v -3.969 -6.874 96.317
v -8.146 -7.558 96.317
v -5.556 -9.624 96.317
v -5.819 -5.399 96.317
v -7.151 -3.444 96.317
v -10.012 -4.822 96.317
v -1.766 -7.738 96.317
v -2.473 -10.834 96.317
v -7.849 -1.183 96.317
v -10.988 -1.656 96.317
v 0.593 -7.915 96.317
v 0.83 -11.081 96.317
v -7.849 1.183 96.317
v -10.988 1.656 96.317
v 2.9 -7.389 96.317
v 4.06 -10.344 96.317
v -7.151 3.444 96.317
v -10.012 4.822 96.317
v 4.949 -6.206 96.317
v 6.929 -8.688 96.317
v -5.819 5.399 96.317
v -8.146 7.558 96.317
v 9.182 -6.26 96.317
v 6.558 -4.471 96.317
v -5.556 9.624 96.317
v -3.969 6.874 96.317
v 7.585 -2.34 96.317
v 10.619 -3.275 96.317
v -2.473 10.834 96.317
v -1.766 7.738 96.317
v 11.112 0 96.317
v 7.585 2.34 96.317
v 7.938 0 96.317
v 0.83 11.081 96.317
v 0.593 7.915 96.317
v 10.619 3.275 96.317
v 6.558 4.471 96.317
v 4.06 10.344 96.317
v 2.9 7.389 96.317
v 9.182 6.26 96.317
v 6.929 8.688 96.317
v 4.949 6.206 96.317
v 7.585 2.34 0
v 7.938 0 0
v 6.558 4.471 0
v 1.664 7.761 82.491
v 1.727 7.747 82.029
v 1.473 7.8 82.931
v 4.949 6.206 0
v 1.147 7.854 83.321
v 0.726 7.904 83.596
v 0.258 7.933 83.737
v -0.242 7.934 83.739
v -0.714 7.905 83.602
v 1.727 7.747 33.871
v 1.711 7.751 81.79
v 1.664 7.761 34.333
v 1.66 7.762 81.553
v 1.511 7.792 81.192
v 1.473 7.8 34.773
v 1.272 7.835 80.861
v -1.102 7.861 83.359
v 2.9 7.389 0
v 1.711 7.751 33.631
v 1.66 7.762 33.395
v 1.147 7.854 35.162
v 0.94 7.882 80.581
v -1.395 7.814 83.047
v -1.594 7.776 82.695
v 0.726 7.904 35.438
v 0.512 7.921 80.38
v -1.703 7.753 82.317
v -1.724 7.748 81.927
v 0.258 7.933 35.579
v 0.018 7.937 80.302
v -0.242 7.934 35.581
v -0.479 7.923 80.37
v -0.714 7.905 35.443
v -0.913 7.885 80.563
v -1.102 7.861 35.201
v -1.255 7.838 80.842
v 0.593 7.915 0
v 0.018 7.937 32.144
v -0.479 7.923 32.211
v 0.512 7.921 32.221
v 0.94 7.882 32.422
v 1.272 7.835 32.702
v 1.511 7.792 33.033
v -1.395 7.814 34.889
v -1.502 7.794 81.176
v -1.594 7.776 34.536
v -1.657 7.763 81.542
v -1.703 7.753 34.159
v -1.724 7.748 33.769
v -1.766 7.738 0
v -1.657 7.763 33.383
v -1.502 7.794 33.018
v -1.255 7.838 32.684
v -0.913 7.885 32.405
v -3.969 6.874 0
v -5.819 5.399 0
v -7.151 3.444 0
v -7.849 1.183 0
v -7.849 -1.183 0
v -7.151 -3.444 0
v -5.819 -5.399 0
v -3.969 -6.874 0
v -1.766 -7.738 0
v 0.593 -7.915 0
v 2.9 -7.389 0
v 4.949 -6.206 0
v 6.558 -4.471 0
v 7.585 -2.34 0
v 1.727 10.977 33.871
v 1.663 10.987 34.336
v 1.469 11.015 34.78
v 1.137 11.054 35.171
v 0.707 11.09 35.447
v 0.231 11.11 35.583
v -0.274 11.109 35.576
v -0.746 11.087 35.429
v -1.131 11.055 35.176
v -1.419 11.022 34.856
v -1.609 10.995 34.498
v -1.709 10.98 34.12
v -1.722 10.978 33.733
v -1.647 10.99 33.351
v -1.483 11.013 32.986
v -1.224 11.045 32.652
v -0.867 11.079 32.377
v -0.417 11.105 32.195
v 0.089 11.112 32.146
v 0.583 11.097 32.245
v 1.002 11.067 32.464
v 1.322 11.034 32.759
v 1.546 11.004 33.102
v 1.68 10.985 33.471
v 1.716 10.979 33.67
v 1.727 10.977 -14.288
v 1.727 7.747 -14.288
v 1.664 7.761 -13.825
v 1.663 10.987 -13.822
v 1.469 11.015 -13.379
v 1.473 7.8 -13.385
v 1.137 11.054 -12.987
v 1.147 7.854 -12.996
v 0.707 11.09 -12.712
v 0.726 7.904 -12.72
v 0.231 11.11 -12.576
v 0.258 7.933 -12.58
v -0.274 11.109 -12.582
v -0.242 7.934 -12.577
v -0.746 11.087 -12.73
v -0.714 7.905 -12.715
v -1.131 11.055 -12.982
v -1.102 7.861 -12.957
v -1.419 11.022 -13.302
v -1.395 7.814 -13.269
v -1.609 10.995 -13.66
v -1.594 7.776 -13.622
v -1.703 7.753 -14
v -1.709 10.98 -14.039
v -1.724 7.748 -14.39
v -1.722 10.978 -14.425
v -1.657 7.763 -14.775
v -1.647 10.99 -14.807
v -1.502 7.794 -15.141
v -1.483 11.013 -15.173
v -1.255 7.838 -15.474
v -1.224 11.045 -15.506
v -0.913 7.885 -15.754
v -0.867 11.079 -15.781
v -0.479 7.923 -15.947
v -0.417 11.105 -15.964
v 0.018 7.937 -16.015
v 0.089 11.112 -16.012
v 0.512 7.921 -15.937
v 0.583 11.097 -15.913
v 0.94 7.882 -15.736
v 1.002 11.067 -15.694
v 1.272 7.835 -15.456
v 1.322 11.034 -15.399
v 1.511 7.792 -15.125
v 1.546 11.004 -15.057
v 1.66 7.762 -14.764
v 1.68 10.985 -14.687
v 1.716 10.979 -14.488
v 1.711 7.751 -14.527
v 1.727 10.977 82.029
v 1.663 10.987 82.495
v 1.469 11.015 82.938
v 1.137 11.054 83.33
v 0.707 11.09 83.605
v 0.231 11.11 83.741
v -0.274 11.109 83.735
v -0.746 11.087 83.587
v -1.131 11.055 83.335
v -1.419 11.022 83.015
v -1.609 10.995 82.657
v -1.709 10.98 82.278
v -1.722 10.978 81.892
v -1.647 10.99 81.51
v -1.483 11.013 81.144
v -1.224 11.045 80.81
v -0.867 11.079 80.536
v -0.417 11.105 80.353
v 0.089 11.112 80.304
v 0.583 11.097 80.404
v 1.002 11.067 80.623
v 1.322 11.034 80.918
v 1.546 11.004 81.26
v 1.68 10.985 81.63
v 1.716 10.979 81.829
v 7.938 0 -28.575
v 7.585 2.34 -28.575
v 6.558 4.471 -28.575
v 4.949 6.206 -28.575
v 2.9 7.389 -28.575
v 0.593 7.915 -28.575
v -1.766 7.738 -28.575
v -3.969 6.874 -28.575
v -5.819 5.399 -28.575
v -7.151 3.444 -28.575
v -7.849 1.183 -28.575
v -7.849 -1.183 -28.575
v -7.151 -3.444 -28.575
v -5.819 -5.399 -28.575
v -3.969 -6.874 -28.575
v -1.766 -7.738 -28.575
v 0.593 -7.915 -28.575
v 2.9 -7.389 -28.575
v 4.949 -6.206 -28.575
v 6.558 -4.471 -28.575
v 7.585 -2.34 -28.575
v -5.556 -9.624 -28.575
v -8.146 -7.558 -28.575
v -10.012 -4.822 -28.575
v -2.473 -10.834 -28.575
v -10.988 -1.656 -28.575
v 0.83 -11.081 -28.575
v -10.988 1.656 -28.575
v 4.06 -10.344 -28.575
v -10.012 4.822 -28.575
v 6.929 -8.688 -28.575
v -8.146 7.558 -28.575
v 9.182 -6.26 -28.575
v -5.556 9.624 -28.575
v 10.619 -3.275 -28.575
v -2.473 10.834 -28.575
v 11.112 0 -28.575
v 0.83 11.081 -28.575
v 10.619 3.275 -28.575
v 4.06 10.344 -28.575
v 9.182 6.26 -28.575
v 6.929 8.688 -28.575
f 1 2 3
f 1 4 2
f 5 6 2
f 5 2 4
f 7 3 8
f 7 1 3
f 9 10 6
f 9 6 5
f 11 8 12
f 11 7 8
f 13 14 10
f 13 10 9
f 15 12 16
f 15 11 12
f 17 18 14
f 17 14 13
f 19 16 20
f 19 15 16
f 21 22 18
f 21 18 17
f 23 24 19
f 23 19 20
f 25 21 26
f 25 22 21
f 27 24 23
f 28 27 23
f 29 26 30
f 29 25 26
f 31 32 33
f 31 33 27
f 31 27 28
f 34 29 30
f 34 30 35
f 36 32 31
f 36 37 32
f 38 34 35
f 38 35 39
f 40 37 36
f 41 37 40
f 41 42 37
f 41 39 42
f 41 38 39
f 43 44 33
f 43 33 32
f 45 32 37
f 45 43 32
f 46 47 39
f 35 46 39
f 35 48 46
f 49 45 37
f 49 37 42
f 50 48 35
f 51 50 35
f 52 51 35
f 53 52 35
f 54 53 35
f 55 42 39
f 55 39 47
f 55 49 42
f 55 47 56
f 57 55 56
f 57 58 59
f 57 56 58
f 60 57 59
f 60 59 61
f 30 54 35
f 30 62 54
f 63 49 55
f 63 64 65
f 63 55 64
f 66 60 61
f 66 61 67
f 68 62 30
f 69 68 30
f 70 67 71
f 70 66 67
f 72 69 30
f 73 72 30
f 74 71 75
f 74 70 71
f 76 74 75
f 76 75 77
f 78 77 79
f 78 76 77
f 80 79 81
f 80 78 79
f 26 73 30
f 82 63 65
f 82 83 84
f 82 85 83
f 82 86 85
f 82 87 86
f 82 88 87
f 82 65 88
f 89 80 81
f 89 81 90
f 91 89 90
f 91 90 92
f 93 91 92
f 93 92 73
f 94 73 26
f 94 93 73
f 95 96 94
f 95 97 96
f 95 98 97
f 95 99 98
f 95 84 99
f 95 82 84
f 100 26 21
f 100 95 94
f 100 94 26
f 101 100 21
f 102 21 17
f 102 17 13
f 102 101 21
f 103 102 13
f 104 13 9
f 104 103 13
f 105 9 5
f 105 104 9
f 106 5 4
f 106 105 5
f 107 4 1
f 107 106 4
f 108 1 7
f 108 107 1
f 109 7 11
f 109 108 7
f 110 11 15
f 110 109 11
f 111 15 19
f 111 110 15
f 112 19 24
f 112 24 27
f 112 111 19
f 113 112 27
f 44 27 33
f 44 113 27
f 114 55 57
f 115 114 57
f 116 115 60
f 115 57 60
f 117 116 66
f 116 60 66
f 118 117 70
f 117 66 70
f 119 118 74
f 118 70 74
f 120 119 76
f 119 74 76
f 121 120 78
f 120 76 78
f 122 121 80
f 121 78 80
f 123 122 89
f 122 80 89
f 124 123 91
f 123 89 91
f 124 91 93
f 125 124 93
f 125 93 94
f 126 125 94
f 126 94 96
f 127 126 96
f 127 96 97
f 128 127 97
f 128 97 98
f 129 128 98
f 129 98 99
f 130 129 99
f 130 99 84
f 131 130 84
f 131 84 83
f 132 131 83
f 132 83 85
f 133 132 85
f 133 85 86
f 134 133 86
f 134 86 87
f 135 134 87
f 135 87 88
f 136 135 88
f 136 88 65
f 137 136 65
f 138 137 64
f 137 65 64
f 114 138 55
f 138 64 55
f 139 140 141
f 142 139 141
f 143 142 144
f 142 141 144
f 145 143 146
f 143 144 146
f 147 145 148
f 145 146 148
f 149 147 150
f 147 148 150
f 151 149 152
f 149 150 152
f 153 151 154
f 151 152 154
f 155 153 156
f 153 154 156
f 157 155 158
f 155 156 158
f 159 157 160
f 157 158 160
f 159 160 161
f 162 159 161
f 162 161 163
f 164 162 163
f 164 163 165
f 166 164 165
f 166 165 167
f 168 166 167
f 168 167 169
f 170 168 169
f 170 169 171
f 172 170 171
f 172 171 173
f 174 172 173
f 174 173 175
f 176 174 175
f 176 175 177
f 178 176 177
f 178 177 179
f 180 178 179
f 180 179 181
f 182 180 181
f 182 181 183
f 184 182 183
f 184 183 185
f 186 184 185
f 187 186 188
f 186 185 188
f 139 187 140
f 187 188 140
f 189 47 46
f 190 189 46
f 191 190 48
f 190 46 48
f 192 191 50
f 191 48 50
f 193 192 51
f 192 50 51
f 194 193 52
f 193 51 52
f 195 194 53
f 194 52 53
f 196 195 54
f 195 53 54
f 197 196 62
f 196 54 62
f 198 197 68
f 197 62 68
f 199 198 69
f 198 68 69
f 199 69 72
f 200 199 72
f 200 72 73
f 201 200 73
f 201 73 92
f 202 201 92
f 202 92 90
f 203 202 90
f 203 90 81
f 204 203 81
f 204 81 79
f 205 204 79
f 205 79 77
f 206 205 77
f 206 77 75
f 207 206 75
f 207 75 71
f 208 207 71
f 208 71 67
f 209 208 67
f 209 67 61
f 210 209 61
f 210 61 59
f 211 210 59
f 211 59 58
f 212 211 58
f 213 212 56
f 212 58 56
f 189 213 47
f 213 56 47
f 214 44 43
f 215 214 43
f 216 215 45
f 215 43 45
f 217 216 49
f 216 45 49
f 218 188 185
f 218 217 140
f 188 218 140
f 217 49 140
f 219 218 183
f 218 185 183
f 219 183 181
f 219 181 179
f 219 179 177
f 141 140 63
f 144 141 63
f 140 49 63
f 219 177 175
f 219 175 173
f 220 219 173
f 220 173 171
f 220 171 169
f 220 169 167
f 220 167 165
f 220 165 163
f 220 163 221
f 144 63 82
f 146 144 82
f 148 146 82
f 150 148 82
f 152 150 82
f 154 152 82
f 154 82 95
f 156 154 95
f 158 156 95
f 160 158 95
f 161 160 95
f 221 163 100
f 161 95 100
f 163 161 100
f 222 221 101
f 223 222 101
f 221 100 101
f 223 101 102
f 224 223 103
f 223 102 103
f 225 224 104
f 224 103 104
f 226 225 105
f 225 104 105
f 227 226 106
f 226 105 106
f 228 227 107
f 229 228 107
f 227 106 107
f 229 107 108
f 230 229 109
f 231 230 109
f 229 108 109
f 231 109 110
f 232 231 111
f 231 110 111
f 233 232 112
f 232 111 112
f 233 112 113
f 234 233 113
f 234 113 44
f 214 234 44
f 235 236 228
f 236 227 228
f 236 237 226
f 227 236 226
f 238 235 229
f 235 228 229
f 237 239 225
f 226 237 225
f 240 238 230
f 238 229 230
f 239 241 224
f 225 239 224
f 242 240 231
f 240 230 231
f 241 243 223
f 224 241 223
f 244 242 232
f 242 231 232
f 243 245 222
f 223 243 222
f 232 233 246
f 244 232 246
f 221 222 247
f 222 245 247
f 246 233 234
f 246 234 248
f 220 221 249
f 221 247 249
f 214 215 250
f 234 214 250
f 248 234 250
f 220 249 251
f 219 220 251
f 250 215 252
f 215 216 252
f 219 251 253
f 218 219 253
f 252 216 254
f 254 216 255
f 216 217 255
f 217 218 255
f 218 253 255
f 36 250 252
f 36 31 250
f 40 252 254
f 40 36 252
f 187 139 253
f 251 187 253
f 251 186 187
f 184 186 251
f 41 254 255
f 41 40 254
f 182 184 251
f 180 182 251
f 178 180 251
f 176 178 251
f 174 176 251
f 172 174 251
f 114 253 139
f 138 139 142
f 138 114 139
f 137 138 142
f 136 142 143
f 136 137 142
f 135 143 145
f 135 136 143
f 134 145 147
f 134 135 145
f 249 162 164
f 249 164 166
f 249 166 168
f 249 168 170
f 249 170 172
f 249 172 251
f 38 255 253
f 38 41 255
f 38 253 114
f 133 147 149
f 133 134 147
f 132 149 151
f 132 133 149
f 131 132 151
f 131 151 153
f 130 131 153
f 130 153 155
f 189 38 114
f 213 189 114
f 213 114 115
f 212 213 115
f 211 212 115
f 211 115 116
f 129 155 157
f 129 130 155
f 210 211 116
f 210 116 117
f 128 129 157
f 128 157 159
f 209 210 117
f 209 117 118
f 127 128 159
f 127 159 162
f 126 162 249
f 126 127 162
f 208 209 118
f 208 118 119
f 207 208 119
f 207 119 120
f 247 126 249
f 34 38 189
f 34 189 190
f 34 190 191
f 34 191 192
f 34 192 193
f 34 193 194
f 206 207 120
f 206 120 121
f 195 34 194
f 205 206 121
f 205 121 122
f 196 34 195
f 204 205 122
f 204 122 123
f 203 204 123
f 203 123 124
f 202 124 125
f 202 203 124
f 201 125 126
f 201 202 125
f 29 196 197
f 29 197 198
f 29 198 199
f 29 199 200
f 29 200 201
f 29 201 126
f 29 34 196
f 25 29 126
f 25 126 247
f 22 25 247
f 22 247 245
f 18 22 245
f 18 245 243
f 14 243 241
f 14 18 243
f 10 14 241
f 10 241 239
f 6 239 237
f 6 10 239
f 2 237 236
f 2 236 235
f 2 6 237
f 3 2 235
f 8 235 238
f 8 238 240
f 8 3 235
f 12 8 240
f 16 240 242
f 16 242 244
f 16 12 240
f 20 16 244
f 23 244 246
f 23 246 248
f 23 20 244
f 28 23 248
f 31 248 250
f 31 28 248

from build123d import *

# Parameters (mm, degrees)
F0_R     = 11.1125
F0_R_2   = 7.9375
F1_DEPTH = 67.7418
F2_DEPTH = 28.575
F3_DEPTH = 28.575
F4_R     = 1.7272
F5_DEPTH = 12.1125001


with BuildPart() as f1:
    # F0 (on Top) → F1 (new body)
    with BuildSketch(Plane.XY):
        Circle(F0_R)
        Circle(F0_R_2, mode=Mode.SUBTRACT)
    extrude(amount=F1_DEPTH)

    # F2 (add): a face of the model
    f2_faces = [f1.faces().sort_by_distance(p)[0] for p in [
        (-10.7981910358, 0, 67.7418),
    ]]
    extrude(f2_faces, amount=F2_DEPTH)

    # F3 (add): a face of the model
    f3_faces = [f1.faces().sort_by_distance(p)[0] for p in [
        (-10.7981910358, 0, 0),
    ]]
    extrude(f3_faces, amount=F3_DEPTH)

    # F4 (on Front) → F5 (cut, up to face)
    with BuildSketch(Plane.XZ):
        with Locations((0, 33.8709)):
            Circle(F4_R)
        with Locations((0, 82.0293)):
            Circle(F4_R)
        with Locations((0, -14.2875)):
            Circle(F4_R)
    extrude(amount=-F5_DEPTH, mode=Mode.SUBTRACT)


solid = f1.part
